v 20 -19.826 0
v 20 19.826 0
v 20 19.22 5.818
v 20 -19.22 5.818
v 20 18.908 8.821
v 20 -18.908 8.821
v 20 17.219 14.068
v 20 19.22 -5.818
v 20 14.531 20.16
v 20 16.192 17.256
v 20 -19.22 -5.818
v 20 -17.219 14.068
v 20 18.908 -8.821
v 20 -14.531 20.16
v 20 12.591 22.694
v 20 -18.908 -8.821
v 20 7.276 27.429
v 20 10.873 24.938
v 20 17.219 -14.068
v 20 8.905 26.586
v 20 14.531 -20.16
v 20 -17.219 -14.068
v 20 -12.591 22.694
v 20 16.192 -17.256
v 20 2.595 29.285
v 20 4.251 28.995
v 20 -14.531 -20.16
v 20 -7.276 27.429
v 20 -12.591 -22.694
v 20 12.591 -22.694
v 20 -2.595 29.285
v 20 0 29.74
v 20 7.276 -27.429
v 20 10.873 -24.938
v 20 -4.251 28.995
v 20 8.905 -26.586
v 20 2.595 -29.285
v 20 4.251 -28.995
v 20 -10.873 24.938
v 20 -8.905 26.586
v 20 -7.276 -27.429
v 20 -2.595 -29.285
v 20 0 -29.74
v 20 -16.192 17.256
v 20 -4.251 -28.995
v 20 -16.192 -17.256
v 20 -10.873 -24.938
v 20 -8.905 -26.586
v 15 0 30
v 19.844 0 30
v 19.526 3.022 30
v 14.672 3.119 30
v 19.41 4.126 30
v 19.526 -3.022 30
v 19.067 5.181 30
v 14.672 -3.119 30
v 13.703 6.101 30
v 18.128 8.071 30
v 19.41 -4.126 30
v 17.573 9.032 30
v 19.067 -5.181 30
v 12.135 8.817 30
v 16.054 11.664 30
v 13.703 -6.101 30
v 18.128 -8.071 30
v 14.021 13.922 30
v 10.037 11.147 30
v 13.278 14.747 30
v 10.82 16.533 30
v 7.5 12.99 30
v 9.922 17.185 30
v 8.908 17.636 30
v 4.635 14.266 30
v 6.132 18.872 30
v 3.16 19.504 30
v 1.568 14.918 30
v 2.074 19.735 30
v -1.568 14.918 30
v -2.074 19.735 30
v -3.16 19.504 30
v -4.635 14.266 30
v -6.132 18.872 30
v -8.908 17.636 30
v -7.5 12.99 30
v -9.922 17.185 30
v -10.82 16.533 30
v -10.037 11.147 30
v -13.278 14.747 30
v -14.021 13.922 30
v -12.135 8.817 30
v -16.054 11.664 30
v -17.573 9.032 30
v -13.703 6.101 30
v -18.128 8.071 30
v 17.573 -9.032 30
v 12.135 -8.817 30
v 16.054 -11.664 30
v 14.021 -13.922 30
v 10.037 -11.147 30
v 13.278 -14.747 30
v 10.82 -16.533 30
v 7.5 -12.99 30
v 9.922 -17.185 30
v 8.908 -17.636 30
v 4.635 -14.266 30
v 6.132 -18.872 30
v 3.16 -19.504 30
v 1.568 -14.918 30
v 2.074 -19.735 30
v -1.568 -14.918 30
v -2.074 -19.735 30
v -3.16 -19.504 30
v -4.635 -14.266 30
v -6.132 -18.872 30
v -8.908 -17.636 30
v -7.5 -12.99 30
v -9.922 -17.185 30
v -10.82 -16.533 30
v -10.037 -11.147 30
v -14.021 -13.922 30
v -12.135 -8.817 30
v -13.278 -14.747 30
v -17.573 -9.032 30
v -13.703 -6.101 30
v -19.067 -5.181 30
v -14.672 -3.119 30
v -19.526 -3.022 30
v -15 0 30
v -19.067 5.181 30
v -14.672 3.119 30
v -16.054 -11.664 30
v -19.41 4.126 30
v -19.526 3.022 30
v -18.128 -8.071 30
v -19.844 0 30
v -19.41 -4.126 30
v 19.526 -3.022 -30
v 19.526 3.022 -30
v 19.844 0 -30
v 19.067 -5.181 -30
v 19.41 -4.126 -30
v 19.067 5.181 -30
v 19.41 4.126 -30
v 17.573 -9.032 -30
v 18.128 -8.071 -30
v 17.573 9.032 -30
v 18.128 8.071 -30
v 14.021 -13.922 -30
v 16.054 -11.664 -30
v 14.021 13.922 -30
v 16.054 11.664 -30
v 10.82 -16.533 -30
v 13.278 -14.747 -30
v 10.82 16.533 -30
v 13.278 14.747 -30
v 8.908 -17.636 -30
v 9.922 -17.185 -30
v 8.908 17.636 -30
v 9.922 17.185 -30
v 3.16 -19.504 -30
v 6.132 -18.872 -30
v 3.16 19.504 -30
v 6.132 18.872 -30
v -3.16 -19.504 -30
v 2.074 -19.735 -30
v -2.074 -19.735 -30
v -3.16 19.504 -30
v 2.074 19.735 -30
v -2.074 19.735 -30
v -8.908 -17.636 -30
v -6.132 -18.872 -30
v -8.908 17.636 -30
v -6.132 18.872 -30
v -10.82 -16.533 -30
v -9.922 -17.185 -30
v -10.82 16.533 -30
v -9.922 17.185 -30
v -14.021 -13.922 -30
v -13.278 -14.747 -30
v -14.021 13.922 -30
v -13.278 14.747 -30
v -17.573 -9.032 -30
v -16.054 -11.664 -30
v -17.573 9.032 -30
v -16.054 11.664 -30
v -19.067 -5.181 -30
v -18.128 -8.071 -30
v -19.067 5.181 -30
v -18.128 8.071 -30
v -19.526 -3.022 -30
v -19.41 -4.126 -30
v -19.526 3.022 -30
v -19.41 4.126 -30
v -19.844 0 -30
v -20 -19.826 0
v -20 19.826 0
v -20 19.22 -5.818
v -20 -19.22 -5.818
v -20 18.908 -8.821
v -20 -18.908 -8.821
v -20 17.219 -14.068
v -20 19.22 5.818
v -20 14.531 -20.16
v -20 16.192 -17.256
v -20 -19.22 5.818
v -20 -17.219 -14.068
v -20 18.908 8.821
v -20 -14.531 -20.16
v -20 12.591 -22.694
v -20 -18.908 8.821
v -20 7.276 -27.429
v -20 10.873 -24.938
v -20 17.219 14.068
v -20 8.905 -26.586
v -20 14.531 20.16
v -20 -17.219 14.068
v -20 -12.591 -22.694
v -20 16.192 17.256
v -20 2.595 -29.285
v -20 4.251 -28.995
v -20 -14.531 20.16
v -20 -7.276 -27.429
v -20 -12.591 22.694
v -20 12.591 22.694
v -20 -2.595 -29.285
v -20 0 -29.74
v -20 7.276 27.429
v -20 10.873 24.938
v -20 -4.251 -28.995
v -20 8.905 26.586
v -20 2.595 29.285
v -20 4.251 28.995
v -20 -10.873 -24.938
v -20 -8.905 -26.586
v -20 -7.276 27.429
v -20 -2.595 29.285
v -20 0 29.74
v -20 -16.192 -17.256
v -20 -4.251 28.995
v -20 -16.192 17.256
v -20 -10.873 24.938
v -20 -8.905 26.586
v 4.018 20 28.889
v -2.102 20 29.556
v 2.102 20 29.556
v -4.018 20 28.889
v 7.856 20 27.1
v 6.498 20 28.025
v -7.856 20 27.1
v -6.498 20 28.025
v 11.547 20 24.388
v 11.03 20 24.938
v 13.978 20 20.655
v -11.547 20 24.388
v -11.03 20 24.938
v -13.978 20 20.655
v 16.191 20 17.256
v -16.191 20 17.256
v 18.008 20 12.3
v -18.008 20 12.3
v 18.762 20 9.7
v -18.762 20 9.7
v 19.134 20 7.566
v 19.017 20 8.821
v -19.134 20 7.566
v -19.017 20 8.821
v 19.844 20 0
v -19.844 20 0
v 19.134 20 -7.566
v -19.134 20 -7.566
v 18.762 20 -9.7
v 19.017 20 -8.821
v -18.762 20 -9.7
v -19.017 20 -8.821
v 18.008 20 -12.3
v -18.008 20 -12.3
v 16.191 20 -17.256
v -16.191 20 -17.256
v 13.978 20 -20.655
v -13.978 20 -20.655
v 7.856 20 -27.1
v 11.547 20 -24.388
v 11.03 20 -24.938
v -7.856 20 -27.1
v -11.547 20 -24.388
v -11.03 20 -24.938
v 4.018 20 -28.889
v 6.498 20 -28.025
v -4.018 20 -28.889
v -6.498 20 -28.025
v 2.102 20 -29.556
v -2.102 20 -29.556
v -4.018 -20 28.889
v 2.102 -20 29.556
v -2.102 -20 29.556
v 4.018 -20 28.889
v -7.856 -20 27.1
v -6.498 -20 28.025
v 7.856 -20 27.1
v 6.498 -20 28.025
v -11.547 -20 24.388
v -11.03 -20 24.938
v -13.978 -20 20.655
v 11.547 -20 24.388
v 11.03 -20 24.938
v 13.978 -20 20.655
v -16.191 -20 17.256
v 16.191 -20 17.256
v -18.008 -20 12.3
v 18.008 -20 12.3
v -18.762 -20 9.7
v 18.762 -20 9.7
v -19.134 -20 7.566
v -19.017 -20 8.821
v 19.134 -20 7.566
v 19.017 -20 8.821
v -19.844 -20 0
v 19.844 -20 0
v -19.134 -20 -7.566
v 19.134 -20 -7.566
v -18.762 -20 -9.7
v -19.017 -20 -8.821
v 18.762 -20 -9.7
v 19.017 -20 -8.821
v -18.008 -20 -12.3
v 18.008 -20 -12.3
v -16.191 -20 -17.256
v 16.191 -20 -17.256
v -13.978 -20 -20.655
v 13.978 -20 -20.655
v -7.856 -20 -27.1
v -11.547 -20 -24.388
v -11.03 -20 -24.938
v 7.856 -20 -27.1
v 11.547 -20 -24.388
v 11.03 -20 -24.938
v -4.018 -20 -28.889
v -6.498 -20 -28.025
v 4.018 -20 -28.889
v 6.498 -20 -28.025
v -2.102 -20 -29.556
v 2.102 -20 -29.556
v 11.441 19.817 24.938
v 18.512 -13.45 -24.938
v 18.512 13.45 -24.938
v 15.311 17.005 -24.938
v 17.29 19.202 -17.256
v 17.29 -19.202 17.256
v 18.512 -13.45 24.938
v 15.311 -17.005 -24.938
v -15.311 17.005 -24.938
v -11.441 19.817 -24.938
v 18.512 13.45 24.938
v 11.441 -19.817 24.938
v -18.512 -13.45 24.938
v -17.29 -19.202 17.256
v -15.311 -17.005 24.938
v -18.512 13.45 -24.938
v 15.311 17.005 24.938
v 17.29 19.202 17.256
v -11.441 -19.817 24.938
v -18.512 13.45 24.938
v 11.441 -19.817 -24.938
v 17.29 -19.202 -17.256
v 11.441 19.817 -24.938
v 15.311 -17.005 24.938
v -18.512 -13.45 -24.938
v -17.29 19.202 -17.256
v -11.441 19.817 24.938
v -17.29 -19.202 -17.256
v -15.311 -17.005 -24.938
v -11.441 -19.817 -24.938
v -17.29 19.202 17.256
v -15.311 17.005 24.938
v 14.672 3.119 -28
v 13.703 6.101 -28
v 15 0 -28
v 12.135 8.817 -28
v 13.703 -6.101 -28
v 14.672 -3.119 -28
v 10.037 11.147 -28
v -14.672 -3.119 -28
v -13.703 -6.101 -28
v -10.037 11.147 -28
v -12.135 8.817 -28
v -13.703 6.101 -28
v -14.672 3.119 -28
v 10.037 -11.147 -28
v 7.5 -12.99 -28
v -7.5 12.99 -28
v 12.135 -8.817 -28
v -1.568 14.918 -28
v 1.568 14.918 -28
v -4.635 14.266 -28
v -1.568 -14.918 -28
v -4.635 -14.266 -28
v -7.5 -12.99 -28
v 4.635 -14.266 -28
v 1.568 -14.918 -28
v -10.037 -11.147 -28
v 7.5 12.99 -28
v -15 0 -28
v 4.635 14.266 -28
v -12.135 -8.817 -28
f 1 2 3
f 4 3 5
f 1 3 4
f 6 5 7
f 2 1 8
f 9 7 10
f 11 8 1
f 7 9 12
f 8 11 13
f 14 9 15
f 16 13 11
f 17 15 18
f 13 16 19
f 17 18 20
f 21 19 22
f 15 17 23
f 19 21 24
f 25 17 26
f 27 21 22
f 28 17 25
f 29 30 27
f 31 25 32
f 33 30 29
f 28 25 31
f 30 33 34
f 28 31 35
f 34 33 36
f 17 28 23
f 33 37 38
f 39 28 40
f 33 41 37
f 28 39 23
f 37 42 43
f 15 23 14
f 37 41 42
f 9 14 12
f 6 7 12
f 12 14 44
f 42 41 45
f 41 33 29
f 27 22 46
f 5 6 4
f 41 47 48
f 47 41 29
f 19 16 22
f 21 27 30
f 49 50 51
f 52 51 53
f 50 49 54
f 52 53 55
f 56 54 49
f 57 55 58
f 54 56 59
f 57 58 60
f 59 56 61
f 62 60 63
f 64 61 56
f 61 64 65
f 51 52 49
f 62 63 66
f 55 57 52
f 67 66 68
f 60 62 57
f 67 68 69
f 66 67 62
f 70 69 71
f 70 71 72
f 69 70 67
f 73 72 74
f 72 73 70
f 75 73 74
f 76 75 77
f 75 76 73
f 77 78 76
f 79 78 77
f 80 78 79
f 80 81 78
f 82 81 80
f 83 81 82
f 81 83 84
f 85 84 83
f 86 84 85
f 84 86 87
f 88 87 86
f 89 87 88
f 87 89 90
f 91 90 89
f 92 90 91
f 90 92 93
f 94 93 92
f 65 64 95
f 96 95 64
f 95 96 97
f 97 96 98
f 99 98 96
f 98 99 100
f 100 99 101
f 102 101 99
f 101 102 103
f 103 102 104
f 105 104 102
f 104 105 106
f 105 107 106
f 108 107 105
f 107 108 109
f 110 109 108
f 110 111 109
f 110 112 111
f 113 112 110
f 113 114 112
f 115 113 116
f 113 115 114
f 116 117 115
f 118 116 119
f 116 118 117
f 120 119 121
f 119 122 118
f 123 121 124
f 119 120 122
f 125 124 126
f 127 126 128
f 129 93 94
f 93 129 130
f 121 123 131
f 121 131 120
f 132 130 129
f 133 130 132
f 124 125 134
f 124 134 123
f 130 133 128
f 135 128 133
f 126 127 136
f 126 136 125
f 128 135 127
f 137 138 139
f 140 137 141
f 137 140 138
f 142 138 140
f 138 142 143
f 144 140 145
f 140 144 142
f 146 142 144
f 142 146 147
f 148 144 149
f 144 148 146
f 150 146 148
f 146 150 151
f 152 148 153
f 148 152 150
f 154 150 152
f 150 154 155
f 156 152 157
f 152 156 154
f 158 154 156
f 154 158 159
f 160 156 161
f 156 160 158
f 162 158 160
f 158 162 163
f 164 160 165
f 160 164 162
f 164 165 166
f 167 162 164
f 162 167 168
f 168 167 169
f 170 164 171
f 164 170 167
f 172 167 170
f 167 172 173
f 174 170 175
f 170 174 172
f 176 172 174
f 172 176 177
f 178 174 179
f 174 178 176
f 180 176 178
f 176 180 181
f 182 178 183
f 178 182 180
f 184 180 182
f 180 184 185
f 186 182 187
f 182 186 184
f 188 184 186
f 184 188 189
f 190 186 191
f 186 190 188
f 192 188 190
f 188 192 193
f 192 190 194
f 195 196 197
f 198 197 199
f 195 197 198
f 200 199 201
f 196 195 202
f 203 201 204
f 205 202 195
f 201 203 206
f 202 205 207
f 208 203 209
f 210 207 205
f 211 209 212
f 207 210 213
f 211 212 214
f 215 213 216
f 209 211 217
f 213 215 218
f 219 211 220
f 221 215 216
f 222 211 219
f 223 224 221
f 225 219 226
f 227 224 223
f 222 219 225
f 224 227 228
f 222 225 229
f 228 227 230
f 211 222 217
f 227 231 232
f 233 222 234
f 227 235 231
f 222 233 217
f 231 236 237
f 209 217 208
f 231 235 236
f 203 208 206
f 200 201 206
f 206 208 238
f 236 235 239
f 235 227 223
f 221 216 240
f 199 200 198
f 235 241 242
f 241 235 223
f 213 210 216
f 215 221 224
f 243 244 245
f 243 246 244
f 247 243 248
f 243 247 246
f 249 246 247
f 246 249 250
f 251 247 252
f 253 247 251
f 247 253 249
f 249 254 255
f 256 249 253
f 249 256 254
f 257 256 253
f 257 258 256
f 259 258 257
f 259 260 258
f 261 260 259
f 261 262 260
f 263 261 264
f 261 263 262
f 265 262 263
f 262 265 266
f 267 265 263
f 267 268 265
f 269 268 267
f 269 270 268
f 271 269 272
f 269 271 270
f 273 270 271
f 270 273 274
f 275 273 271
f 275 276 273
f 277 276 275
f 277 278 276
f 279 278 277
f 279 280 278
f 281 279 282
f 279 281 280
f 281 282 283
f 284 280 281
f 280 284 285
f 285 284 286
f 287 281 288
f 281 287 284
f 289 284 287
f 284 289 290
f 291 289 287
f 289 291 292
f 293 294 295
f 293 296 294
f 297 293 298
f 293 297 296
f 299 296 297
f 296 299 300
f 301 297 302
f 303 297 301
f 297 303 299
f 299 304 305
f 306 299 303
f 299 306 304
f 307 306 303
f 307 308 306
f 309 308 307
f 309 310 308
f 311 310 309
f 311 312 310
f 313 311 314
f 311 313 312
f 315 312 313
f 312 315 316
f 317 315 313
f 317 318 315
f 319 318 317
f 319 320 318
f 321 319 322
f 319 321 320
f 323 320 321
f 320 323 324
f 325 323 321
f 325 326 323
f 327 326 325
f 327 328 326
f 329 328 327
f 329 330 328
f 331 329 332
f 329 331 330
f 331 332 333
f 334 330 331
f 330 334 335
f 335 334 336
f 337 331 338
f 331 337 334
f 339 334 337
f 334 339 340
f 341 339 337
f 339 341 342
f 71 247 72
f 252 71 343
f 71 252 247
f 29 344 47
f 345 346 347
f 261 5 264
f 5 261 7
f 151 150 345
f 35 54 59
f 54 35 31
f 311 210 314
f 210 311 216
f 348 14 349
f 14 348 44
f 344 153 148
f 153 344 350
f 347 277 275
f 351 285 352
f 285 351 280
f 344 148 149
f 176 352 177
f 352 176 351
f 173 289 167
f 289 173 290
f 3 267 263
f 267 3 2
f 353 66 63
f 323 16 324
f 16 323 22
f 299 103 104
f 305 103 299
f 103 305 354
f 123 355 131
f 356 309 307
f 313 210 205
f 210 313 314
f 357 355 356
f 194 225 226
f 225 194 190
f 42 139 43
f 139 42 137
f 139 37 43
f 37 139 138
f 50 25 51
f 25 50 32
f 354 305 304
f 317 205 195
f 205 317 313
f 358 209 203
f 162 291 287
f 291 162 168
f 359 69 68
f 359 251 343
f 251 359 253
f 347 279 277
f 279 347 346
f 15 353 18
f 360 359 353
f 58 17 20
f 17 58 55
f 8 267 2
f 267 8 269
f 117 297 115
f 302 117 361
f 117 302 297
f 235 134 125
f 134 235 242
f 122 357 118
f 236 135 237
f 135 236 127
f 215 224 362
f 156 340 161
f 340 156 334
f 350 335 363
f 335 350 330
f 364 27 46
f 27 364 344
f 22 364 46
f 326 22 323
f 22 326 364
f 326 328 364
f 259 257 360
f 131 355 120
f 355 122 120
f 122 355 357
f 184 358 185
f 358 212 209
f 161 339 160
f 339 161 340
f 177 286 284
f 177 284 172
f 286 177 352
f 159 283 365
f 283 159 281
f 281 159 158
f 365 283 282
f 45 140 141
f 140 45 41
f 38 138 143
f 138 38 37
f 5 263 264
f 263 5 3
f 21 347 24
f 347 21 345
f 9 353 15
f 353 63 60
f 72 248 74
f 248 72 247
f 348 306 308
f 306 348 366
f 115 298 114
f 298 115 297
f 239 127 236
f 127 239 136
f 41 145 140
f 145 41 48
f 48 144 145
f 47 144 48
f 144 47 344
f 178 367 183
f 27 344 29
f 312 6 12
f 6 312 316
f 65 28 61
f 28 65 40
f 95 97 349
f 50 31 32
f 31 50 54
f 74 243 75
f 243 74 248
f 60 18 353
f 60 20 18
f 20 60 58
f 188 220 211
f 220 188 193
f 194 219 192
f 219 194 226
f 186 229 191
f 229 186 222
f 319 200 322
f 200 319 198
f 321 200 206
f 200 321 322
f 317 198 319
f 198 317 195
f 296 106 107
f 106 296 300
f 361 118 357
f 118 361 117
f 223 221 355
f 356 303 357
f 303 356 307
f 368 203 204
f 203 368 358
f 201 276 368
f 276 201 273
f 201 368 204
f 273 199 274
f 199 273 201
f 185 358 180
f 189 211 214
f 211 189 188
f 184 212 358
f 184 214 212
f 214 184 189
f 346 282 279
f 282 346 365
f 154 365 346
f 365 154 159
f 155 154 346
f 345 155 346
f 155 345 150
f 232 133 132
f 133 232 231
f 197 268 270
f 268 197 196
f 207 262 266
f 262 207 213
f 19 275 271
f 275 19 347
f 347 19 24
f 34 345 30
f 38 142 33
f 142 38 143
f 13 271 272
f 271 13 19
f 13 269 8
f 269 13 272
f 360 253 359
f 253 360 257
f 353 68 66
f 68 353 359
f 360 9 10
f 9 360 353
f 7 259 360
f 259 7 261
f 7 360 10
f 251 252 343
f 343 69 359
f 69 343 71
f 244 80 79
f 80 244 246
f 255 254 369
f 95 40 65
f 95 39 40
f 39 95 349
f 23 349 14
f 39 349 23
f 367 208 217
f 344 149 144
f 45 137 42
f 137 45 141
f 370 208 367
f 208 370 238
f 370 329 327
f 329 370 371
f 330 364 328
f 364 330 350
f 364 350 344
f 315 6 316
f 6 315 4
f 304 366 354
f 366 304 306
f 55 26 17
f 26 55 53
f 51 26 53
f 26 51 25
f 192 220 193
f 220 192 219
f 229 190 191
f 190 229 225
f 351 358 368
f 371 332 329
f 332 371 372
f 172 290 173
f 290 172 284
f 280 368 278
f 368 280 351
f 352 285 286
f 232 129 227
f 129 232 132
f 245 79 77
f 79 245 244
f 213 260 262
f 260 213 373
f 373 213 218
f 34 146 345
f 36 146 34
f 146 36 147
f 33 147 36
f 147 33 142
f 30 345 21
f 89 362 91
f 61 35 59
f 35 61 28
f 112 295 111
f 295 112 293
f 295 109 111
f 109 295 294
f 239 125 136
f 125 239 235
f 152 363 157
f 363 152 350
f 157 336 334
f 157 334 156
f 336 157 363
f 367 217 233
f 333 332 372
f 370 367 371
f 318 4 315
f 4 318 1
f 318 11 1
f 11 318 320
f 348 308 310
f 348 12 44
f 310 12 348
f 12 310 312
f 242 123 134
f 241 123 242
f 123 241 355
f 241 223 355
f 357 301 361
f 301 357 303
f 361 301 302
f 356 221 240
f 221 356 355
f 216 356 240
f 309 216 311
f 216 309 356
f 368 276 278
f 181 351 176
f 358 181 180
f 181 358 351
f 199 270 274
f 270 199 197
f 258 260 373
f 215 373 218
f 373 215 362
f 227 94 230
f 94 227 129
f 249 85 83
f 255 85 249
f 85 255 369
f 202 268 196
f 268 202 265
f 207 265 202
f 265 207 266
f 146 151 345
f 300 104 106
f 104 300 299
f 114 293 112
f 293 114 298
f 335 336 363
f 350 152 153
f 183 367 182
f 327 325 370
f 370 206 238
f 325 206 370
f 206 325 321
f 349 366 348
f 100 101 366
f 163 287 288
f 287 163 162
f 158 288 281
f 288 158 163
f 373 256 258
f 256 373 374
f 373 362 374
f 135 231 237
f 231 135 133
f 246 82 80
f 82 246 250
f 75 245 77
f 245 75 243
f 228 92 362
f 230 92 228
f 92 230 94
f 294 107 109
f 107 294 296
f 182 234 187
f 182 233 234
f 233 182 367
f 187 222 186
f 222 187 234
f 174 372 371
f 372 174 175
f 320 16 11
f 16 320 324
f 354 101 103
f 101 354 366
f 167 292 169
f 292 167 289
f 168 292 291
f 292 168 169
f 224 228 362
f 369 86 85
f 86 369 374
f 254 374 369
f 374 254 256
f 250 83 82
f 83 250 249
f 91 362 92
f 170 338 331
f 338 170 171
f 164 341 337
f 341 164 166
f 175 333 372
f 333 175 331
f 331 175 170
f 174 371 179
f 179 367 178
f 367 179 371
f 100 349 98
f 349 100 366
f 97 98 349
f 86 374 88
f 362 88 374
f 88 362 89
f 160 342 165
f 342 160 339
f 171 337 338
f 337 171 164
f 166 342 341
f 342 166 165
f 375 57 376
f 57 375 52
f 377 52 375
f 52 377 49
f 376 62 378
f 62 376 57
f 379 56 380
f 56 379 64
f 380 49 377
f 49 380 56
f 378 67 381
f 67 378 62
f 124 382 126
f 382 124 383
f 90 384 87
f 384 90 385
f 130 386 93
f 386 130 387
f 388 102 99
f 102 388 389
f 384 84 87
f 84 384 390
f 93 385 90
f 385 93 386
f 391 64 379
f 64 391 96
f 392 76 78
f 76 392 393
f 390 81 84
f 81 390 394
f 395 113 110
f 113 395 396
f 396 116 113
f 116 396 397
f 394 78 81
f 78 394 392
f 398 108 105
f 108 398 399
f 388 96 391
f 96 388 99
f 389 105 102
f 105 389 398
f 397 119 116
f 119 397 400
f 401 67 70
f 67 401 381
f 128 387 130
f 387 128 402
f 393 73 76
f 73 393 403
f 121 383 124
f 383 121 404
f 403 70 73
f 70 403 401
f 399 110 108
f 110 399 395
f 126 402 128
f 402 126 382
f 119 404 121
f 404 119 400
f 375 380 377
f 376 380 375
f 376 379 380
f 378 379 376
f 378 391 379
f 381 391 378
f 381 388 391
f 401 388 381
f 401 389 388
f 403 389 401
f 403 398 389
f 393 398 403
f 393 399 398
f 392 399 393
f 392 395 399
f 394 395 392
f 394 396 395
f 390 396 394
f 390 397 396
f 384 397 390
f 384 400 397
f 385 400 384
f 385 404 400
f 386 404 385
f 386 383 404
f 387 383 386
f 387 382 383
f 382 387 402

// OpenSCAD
width=40;
height=40;
bottom_thickness=2;
wall_thickness=2;

module mug(width, height, bottom_thickness=2, wall_thickness=5)
{
    difference()
    {
        intersection()
        {
            cube([width,width,height], center=true);
            scale([1,1,height/width])
            sphere(width/2 * sqrt(2));
        }
        translate([0,0,-height/2+bottom_thickness])
        {
            cylinder(r=width/2-wall_thickness,h=height+0.1);
        }
    }
}
  

mug(40,60);
